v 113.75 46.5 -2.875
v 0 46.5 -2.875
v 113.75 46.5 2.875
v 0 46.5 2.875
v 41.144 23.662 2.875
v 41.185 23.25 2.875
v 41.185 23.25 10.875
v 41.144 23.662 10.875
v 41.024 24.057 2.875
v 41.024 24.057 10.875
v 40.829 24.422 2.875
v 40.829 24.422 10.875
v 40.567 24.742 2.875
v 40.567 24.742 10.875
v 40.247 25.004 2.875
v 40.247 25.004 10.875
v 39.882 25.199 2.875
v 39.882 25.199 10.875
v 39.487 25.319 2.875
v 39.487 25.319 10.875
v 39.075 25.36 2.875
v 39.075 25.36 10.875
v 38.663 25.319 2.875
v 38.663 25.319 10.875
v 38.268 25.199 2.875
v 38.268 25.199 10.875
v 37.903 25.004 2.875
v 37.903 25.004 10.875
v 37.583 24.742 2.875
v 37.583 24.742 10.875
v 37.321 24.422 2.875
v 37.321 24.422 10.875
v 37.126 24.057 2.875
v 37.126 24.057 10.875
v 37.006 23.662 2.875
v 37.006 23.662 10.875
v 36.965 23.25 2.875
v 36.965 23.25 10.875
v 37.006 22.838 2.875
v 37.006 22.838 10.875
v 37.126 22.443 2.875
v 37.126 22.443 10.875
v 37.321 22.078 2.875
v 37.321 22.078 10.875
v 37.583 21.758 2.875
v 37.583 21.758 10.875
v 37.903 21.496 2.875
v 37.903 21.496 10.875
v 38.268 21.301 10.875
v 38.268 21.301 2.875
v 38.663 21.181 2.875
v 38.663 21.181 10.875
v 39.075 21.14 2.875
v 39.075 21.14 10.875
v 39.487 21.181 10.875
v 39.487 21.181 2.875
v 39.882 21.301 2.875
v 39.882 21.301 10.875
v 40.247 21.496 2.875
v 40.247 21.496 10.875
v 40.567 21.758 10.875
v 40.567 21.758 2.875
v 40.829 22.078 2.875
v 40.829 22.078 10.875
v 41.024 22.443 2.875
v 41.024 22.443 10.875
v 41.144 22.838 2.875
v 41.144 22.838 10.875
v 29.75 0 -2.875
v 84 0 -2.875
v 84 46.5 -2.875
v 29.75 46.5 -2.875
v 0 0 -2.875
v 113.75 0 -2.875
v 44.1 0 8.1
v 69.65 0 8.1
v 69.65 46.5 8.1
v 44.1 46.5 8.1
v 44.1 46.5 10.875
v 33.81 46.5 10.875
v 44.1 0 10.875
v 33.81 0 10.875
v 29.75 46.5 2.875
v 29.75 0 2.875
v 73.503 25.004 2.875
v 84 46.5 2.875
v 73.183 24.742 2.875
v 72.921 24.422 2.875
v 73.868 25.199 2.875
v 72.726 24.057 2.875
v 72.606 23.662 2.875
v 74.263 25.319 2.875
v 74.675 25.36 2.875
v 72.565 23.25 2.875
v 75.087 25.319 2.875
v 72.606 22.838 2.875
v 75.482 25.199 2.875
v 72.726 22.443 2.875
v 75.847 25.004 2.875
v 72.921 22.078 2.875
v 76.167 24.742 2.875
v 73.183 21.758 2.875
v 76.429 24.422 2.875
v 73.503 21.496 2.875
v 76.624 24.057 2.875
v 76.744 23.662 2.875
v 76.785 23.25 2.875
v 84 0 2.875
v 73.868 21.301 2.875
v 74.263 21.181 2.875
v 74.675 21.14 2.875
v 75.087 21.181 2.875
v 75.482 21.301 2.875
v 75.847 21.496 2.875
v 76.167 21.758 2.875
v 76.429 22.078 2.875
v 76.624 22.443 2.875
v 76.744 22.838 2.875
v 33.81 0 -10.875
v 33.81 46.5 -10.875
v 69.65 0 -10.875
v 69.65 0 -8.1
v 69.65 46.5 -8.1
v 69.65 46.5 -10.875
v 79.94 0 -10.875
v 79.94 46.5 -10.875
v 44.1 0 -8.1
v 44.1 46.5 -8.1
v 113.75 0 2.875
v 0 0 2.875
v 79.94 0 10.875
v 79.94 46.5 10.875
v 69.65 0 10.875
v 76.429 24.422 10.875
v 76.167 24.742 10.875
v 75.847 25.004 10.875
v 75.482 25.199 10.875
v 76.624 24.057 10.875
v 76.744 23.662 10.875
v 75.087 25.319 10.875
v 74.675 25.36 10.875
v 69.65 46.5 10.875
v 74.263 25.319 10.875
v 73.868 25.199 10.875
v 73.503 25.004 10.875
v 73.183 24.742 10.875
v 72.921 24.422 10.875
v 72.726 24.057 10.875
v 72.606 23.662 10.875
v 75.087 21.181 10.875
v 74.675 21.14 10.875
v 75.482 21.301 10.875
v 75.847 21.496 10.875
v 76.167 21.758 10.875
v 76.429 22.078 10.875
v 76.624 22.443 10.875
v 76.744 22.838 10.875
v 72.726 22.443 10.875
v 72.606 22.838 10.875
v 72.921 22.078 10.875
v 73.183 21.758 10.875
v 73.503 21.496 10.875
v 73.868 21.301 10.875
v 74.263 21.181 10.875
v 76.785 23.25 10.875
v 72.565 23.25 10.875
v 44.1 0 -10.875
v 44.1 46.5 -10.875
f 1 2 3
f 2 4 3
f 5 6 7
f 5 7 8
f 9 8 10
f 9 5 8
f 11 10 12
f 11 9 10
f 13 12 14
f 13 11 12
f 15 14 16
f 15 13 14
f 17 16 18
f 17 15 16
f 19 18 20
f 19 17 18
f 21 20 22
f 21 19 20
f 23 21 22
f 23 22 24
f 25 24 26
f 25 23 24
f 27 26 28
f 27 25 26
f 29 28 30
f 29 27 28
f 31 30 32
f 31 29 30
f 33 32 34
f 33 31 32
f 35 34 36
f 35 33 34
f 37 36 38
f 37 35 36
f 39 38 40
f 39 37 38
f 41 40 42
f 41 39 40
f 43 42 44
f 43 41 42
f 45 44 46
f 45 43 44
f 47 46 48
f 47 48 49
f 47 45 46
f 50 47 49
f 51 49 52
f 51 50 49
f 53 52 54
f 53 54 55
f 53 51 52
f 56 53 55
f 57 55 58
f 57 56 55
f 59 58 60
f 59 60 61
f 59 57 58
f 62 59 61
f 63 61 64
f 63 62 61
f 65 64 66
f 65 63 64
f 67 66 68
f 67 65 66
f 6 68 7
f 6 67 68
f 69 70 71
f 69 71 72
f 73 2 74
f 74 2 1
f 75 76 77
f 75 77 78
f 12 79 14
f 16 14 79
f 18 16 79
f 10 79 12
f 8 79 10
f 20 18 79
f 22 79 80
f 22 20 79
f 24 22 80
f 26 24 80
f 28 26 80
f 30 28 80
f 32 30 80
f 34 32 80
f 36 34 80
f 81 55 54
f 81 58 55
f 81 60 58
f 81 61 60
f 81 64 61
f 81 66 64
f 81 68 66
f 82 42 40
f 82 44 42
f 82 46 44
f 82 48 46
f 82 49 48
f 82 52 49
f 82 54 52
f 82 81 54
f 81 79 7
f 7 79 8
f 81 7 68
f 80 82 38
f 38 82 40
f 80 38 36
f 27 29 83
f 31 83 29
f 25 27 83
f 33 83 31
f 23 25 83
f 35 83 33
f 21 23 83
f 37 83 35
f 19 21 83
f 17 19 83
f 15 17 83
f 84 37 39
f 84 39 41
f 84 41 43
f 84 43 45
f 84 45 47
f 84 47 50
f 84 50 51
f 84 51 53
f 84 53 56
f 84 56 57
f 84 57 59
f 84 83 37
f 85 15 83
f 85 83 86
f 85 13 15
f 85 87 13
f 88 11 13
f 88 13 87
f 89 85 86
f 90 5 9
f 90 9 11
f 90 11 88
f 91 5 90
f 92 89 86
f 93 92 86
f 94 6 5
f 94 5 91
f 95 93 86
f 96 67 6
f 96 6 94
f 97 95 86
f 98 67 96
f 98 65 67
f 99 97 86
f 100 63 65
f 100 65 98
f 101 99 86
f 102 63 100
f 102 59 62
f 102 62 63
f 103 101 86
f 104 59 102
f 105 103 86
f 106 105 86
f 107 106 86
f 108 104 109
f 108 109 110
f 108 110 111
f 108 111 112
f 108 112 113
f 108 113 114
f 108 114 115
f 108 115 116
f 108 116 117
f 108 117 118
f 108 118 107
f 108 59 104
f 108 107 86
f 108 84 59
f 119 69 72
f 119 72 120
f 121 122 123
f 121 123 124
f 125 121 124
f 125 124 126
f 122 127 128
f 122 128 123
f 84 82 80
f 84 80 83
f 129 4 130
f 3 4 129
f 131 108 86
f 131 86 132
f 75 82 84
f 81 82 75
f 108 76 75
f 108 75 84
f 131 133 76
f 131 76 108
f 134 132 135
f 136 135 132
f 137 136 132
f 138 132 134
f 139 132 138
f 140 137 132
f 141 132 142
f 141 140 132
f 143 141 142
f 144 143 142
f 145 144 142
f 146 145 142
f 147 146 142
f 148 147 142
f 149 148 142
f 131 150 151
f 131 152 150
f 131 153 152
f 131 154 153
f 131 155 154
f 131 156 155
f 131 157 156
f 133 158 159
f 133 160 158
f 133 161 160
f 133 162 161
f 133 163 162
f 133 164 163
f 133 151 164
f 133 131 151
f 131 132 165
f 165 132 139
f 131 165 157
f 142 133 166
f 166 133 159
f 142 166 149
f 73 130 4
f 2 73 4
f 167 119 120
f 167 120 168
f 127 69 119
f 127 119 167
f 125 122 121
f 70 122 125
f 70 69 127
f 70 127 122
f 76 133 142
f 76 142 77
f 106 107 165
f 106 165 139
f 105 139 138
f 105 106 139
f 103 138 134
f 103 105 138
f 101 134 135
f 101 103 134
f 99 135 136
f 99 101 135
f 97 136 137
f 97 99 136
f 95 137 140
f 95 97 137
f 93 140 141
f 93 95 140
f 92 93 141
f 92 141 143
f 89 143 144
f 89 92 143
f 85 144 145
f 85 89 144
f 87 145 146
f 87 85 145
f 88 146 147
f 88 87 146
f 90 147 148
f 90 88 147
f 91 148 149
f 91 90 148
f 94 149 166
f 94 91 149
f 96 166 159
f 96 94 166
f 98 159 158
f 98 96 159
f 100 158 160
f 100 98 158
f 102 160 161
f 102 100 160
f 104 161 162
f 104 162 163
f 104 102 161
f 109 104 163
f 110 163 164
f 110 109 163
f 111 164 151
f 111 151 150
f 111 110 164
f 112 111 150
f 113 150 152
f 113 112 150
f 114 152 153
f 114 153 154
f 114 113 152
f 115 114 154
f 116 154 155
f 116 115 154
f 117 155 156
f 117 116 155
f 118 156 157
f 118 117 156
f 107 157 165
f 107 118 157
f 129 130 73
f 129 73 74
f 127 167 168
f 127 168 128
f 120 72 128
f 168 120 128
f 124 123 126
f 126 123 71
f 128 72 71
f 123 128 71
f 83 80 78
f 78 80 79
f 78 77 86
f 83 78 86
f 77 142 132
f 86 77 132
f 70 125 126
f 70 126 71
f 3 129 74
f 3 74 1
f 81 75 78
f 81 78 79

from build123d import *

# Parameters (mm, degrees)
F0_W     = 113.75
F0_H     = 46.5
F1_DEPTH = 2.875
F3_DEPTH = 46.5
F4_R     = 2.11
F5_DEPTH = 8


with BuildPart() as f1:
    # F0 (on Top) → F1 (new body, symmetric)
    with BuildSketch(Plane.XY):
        with Locations((56.875, 23.25)):
            Rectangle(F0_W, F0_H)
    extrude(amount=F1_DEPTH, both=True)


with BuildPart() as f3:
    # F2 (on face) → F3 (new body)
    with BuildSketch(Plane.XZ):
        Polygon((84, -2.875), (29.75, -2.875), (33.81, -10.875), (44.1, -10.875), (44.1, -8.1), (69.65, -8.1), (69.65, -10.875), (79.94, -10.875), align=None)
        Polygon((33.81, 10.875), (29.75, 2.875), (84, 2.875), (79.94, 10.875), (69.65, 10.875), (69.65, 8.1), (44.1, 8.1), (44.1, 10.875), align=None)
    extrude(amount=-F3_DEPTH)

    # F4 (on face) → F5 (cut, through all)
    with BuildSketch(Plane.XY.offset(2.875)):
        with Locations((39.075, 23.25)):
            Circle(F4_R)
        with Locations((74.675, 23.25)):
            Circle(F4_R)
    extrude(amount=F5_DEPTH, mode=Mode.SUBTRACT)


solid = Compound([f1.part, f3.part])
